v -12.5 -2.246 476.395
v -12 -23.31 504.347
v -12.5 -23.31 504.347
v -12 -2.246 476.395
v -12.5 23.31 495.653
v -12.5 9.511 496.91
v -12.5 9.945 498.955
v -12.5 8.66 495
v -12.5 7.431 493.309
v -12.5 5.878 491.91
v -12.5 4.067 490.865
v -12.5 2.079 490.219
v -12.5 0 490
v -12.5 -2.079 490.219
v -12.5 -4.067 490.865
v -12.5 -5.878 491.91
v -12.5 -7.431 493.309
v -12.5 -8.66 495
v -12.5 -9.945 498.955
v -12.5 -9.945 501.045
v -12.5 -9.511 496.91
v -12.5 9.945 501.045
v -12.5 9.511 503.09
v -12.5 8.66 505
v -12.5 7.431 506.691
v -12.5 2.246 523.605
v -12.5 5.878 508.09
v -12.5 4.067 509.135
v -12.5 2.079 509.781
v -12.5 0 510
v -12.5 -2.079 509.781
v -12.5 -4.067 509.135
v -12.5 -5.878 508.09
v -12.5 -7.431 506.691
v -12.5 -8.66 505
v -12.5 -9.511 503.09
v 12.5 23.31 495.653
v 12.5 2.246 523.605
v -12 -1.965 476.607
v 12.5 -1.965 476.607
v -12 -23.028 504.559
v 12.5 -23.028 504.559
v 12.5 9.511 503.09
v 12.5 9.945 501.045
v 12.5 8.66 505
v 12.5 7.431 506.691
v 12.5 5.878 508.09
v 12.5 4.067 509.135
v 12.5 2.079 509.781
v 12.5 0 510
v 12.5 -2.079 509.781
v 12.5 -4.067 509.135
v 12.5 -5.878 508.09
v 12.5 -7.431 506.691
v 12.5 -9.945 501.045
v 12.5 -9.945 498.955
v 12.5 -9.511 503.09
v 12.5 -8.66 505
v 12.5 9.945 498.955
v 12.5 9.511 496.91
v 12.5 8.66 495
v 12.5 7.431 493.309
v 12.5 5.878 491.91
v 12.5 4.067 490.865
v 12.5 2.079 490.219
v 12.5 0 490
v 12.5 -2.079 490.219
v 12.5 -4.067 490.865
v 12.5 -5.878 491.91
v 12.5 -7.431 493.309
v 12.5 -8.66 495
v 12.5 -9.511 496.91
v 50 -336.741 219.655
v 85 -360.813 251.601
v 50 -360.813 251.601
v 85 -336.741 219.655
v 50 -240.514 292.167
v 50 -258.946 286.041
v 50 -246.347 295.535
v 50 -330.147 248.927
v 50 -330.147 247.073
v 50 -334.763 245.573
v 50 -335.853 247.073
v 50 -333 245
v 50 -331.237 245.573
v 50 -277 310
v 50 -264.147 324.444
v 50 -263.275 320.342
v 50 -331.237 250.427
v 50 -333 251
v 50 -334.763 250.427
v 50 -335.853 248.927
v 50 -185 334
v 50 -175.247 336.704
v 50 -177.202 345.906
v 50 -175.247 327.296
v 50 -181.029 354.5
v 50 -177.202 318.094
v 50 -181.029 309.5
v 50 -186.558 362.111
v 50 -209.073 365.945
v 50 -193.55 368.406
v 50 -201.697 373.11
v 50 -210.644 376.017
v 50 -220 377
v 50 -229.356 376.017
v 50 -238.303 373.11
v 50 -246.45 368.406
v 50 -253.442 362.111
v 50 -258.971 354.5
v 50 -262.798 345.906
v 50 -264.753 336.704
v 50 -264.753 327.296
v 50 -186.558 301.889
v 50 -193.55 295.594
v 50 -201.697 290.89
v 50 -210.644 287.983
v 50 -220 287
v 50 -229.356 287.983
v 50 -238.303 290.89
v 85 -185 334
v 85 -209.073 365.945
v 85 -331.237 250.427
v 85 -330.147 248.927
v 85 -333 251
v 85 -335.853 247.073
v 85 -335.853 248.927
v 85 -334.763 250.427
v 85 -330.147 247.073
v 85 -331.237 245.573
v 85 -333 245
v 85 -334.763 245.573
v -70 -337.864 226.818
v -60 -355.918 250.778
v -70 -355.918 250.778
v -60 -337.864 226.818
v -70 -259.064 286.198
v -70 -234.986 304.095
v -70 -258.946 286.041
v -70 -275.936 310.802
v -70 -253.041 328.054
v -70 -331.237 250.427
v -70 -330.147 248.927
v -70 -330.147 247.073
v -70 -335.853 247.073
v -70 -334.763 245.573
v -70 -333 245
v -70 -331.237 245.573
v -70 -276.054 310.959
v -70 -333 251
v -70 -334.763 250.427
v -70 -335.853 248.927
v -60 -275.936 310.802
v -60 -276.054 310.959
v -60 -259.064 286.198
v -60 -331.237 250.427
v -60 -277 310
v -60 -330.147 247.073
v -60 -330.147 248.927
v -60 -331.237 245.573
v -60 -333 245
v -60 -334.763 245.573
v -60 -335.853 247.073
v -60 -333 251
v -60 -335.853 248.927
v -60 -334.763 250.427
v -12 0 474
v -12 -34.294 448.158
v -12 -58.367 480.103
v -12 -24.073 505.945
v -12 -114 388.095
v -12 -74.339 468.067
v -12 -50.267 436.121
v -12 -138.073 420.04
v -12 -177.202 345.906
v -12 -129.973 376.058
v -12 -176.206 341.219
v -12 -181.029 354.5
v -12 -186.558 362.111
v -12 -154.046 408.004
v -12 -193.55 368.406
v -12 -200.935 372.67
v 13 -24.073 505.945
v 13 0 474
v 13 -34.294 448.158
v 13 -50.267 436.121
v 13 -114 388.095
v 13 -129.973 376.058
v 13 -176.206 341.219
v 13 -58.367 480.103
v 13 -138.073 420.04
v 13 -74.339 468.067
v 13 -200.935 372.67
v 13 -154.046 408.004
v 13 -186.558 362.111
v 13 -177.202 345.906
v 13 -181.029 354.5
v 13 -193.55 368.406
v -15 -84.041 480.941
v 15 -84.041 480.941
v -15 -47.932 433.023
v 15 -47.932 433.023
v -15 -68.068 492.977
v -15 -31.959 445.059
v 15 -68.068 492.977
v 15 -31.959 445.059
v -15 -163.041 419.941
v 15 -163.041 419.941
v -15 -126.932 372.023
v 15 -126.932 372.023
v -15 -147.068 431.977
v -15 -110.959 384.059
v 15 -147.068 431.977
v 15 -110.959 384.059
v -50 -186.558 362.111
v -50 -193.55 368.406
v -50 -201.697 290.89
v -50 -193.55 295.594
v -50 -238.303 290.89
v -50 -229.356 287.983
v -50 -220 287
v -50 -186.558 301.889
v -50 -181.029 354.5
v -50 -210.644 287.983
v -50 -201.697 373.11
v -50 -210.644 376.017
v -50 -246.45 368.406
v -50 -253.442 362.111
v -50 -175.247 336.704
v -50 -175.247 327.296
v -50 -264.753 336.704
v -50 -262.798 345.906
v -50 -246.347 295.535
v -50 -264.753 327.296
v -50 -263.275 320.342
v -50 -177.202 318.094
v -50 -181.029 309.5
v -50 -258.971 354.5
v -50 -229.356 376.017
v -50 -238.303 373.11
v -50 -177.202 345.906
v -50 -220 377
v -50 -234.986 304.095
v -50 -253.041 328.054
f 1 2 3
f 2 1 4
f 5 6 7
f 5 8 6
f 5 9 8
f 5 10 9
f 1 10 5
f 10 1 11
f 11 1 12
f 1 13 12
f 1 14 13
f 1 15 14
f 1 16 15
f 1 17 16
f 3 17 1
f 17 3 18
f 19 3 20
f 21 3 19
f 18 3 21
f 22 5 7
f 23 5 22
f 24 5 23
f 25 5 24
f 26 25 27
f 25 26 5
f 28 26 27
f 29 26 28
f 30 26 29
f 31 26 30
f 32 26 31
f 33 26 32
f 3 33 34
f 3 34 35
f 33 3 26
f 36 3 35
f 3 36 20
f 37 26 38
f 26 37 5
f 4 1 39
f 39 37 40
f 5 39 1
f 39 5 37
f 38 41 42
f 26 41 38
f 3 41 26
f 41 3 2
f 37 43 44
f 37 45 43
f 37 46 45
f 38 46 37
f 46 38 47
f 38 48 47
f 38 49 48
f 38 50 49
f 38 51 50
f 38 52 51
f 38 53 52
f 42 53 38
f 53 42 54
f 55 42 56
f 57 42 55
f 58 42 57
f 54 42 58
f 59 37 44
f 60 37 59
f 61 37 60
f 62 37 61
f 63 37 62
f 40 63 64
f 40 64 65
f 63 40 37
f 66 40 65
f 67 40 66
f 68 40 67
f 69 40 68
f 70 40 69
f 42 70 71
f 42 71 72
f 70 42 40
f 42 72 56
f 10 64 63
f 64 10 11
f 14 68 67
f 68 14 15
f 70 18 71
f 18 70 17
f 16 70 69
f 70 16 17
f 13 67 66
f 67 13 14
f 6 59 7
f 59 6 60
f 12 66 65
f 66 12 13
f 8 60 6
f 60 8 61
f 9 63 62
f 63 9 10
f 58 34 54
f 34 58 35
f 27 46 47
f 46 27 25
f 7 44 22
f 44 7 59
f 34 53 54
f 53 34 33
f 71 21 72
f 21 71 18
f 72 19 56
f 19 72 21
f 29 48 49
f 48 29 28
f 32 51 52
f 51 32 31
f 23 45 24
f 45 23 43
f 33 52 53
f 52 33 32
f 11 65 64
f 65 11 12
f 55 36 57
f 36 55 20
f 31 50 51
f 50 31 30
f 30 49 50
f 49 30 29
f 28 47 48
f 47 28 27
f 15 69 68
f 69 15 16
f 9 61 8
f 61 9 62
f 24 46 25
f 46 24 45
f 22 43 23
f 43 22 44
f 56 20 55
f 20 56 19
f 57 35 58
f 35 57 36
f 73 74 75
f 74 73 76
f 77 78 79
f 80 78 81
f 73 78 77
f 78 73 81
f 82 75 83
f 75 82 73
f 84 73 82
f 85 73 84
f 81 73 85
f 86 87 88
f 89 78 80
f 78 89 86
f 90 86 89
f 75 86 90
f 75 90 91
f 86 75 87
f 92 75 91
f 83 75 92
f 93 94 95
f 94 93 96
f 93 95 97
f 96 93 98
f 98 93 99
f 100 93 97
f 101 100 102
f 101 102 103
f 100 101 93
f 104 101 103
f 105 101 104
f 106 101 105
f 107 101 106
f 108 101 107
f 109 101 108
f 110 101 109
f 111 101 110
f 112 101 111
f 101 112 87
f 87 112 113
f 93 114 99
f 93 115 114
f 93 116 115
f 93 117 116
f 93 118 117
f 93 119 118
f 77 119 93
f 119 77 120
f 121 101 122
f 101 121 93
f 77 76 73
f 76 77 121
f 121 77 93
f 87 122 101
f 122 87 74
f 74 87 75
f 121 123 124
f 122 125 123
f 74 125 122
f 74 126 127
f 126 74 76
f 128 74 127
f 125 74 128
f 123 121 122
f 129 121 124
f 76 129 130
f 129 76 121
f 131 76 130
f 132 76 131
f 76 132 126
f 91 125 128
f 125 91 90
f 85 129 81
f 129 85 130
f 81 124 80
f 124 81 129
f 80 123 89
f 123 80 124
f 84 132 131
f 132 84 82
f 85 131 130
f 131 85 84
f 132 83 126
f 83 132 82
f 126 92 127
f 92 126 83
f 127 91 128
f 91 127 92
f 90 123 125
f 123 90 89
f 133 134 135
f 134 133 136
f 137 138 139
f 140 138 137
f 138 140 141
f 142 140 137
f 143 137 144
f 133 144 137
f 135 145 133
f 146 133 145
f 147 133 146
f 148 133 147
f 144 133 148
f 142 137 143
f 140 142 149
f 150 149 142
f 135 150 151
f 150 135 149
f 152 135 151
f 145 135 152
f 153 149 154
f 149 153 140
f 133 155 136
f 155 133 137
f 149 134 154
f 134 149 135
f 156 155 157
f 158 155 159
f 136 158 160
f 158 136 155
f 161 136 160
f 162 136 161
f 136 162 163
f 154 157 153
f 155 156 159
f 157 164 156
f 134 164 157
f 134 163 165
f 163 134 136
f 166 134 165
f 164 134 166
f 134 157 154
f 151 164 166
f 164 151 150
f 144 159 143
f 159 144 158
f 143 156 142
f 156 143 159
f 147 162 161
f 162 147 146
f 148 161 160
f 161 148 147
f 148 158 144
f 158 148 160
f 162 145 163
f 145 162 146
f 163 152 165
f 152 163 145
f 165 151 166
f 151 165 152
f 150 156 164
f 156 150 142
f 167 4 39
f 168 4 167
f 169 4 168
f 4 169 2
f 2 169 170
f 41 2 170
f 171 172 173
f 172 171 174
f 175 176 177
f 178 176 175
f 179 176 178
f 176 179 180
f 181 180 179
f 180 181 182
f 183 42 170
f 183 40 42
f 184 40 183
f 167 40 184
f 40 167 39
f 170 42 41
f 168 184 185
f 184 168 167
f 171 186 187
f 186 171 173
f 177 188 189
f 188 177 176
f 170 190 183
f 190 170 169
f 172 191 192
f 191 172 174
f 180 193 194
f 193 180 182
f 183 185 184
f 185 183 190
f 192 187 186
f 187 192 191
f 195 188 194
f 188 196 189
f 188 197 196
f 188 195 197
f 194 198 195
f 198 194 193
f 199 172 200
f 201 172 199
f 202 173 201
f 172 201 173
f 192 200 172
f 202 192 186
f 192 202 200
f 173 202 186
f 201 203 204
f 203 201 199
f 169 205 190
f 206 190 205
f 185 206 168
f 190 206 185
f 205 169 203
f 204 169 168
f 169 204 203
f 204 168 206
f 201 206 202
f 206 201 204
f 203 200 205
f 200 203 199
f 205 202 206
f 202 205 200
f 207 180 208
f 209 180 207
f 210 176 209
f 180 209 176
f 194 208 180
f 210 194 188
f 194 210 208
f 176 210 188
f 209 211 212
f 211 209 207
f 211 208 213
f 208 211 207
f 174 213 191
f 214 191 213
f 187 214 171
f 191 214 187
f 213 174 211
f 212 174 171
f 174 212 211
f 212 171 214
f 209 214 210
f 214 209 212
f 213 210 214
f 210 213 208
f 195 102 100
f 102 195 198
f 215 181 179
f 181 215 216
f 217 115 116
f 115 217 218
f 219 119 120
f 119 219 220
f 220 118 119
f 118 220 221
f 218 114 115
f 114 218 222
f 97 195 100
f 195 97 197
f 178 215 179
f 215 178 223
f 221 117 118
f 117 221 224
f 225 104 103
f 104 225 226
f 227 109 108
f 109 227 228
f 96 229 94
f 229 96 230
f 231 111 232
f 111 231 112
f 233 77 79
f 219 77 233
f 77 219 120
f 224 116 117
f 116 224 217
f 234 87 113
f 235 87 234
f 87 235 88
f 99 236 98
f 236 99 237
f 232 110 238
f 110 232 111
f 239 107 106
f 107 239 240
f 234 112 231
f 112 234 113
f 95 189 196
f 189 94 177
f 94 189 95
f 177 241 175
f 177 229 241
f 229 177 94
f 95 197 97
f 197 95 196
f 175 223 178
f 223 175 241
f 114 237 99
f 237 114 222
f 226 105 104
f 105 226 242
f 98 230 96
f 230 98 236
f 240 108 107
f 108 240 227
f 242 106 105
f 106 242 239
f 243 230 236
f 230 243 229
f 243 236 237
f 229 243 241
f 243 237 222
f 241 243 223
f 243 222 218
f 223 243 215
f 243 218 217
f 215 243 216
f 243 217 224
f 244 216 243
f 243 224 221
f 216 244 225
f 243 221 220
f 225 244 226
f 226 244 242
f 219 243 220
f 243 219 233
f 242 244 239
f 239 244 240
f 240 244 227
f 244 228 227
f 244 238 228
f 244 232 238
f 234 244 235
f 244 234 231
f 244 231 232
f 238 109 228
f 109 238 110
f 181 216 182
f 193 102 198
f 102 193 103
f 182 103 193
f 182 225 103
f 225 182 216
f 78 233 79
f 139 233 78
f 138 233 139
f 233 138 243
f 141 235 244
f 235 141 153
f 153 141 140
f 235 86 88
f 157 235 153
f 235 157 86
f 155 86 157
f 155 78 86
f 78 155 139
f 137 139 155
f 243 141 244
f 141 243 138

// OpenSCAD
// === STL Reference (visual only, not exported) ===
// %scale(1000) import("l2.stl");

// === Common Rotation Angle for L2 Axis ===
l2_angle = 127;

// === Bar ===
bar_pos      = [-12, 0, 474];
bar_dim      = [25, 40, 230];

translate(bar_pos)
    rotate([l2_angle, 0, 0])
        cube(bar_dim);

// === L2 Fixed Joint Hole ===
joint_pos = [0, 0, 500];
joint_outer_dim = [25, 35, 32];
joint_hole_radius = 10;
joint_hole_depth = 35;

translate(joint_pos)
    difference() {
        rotate([l2_angle, 0, 0])
            cube(joint_outer_dim, center = true);
        rotate([0, 90, 0])
            cylinder(r = joint_hole_radius, h = joint_hole_depth, center = true);
    }

// === Wire Clips ===
clip_dim = [30, 60, 20];

clip_top_pos = [0, -58, 463];
clip_bot_pos = [0, -137, 402];

translate(clip_top_pos)
    rotate([l2_angle, 0, 0])
        cube(clip_dim, center = true);

translate(clip_bot_pos)
    rotate([l2_angle, 0, 0])
        cube(clip_dim, center = true);

// === J4 Housing Cylinder ===
j4_housing_radius = 45;
j4_housing_depth  = 100;
j4_housing_pos    = [0, -220, 332];

translate(j4_housing_pos)
    rotate([0, 90, 0])
        cylinder(r = j4_housing_radius, h = j4_housing_depth, center = true);

// === J4–J5 Connector Block with Hole ===
conn_block_pos   = [100 / 2, -185, 334];
conn_block_dim   = [35, 40, 190];
conn_hole_radius = 3;
conn_hole_length = 450;
conn_hole_pos    = [100 / 2, -333, 248];

difference() {
    translate(conn_block_pos)
        rotate([l2_angle, 0, 0])
            cube(conn_block_dim);
    translate(conn_hole_pos)
        rotate([0, 90, 0])
            cylinder(r = conn_hole_radius, h = conn_hole_length, center = true);
}

// === Side Cube Connector (Rotated Block) ===
side_cube_pos = [100 / 2, -277, 310];
side_cube_dim = [120, 30, 30];
side_cube_angle = 143;

translate(side_cube_pos)
    rotate([side_cube_angle, 0, 180])
        cube(side_cube_dim);

// === Left Clip Bracket with Hole ===
clip_bracket_pos = [-70, -258, 287];
clip_bracket_dim = [10, 30, 100];

difference() {
    translate(clip_bracket_pos)
        rotate([l2_angle, 0, 0])
            cube(clip_bracket_dim);
    translate(conn_hole_pos)
        rotate([0, 90, 0])
            cylinder(r = conn_hole_radius, h = conn_hole_length, center = true);
}
